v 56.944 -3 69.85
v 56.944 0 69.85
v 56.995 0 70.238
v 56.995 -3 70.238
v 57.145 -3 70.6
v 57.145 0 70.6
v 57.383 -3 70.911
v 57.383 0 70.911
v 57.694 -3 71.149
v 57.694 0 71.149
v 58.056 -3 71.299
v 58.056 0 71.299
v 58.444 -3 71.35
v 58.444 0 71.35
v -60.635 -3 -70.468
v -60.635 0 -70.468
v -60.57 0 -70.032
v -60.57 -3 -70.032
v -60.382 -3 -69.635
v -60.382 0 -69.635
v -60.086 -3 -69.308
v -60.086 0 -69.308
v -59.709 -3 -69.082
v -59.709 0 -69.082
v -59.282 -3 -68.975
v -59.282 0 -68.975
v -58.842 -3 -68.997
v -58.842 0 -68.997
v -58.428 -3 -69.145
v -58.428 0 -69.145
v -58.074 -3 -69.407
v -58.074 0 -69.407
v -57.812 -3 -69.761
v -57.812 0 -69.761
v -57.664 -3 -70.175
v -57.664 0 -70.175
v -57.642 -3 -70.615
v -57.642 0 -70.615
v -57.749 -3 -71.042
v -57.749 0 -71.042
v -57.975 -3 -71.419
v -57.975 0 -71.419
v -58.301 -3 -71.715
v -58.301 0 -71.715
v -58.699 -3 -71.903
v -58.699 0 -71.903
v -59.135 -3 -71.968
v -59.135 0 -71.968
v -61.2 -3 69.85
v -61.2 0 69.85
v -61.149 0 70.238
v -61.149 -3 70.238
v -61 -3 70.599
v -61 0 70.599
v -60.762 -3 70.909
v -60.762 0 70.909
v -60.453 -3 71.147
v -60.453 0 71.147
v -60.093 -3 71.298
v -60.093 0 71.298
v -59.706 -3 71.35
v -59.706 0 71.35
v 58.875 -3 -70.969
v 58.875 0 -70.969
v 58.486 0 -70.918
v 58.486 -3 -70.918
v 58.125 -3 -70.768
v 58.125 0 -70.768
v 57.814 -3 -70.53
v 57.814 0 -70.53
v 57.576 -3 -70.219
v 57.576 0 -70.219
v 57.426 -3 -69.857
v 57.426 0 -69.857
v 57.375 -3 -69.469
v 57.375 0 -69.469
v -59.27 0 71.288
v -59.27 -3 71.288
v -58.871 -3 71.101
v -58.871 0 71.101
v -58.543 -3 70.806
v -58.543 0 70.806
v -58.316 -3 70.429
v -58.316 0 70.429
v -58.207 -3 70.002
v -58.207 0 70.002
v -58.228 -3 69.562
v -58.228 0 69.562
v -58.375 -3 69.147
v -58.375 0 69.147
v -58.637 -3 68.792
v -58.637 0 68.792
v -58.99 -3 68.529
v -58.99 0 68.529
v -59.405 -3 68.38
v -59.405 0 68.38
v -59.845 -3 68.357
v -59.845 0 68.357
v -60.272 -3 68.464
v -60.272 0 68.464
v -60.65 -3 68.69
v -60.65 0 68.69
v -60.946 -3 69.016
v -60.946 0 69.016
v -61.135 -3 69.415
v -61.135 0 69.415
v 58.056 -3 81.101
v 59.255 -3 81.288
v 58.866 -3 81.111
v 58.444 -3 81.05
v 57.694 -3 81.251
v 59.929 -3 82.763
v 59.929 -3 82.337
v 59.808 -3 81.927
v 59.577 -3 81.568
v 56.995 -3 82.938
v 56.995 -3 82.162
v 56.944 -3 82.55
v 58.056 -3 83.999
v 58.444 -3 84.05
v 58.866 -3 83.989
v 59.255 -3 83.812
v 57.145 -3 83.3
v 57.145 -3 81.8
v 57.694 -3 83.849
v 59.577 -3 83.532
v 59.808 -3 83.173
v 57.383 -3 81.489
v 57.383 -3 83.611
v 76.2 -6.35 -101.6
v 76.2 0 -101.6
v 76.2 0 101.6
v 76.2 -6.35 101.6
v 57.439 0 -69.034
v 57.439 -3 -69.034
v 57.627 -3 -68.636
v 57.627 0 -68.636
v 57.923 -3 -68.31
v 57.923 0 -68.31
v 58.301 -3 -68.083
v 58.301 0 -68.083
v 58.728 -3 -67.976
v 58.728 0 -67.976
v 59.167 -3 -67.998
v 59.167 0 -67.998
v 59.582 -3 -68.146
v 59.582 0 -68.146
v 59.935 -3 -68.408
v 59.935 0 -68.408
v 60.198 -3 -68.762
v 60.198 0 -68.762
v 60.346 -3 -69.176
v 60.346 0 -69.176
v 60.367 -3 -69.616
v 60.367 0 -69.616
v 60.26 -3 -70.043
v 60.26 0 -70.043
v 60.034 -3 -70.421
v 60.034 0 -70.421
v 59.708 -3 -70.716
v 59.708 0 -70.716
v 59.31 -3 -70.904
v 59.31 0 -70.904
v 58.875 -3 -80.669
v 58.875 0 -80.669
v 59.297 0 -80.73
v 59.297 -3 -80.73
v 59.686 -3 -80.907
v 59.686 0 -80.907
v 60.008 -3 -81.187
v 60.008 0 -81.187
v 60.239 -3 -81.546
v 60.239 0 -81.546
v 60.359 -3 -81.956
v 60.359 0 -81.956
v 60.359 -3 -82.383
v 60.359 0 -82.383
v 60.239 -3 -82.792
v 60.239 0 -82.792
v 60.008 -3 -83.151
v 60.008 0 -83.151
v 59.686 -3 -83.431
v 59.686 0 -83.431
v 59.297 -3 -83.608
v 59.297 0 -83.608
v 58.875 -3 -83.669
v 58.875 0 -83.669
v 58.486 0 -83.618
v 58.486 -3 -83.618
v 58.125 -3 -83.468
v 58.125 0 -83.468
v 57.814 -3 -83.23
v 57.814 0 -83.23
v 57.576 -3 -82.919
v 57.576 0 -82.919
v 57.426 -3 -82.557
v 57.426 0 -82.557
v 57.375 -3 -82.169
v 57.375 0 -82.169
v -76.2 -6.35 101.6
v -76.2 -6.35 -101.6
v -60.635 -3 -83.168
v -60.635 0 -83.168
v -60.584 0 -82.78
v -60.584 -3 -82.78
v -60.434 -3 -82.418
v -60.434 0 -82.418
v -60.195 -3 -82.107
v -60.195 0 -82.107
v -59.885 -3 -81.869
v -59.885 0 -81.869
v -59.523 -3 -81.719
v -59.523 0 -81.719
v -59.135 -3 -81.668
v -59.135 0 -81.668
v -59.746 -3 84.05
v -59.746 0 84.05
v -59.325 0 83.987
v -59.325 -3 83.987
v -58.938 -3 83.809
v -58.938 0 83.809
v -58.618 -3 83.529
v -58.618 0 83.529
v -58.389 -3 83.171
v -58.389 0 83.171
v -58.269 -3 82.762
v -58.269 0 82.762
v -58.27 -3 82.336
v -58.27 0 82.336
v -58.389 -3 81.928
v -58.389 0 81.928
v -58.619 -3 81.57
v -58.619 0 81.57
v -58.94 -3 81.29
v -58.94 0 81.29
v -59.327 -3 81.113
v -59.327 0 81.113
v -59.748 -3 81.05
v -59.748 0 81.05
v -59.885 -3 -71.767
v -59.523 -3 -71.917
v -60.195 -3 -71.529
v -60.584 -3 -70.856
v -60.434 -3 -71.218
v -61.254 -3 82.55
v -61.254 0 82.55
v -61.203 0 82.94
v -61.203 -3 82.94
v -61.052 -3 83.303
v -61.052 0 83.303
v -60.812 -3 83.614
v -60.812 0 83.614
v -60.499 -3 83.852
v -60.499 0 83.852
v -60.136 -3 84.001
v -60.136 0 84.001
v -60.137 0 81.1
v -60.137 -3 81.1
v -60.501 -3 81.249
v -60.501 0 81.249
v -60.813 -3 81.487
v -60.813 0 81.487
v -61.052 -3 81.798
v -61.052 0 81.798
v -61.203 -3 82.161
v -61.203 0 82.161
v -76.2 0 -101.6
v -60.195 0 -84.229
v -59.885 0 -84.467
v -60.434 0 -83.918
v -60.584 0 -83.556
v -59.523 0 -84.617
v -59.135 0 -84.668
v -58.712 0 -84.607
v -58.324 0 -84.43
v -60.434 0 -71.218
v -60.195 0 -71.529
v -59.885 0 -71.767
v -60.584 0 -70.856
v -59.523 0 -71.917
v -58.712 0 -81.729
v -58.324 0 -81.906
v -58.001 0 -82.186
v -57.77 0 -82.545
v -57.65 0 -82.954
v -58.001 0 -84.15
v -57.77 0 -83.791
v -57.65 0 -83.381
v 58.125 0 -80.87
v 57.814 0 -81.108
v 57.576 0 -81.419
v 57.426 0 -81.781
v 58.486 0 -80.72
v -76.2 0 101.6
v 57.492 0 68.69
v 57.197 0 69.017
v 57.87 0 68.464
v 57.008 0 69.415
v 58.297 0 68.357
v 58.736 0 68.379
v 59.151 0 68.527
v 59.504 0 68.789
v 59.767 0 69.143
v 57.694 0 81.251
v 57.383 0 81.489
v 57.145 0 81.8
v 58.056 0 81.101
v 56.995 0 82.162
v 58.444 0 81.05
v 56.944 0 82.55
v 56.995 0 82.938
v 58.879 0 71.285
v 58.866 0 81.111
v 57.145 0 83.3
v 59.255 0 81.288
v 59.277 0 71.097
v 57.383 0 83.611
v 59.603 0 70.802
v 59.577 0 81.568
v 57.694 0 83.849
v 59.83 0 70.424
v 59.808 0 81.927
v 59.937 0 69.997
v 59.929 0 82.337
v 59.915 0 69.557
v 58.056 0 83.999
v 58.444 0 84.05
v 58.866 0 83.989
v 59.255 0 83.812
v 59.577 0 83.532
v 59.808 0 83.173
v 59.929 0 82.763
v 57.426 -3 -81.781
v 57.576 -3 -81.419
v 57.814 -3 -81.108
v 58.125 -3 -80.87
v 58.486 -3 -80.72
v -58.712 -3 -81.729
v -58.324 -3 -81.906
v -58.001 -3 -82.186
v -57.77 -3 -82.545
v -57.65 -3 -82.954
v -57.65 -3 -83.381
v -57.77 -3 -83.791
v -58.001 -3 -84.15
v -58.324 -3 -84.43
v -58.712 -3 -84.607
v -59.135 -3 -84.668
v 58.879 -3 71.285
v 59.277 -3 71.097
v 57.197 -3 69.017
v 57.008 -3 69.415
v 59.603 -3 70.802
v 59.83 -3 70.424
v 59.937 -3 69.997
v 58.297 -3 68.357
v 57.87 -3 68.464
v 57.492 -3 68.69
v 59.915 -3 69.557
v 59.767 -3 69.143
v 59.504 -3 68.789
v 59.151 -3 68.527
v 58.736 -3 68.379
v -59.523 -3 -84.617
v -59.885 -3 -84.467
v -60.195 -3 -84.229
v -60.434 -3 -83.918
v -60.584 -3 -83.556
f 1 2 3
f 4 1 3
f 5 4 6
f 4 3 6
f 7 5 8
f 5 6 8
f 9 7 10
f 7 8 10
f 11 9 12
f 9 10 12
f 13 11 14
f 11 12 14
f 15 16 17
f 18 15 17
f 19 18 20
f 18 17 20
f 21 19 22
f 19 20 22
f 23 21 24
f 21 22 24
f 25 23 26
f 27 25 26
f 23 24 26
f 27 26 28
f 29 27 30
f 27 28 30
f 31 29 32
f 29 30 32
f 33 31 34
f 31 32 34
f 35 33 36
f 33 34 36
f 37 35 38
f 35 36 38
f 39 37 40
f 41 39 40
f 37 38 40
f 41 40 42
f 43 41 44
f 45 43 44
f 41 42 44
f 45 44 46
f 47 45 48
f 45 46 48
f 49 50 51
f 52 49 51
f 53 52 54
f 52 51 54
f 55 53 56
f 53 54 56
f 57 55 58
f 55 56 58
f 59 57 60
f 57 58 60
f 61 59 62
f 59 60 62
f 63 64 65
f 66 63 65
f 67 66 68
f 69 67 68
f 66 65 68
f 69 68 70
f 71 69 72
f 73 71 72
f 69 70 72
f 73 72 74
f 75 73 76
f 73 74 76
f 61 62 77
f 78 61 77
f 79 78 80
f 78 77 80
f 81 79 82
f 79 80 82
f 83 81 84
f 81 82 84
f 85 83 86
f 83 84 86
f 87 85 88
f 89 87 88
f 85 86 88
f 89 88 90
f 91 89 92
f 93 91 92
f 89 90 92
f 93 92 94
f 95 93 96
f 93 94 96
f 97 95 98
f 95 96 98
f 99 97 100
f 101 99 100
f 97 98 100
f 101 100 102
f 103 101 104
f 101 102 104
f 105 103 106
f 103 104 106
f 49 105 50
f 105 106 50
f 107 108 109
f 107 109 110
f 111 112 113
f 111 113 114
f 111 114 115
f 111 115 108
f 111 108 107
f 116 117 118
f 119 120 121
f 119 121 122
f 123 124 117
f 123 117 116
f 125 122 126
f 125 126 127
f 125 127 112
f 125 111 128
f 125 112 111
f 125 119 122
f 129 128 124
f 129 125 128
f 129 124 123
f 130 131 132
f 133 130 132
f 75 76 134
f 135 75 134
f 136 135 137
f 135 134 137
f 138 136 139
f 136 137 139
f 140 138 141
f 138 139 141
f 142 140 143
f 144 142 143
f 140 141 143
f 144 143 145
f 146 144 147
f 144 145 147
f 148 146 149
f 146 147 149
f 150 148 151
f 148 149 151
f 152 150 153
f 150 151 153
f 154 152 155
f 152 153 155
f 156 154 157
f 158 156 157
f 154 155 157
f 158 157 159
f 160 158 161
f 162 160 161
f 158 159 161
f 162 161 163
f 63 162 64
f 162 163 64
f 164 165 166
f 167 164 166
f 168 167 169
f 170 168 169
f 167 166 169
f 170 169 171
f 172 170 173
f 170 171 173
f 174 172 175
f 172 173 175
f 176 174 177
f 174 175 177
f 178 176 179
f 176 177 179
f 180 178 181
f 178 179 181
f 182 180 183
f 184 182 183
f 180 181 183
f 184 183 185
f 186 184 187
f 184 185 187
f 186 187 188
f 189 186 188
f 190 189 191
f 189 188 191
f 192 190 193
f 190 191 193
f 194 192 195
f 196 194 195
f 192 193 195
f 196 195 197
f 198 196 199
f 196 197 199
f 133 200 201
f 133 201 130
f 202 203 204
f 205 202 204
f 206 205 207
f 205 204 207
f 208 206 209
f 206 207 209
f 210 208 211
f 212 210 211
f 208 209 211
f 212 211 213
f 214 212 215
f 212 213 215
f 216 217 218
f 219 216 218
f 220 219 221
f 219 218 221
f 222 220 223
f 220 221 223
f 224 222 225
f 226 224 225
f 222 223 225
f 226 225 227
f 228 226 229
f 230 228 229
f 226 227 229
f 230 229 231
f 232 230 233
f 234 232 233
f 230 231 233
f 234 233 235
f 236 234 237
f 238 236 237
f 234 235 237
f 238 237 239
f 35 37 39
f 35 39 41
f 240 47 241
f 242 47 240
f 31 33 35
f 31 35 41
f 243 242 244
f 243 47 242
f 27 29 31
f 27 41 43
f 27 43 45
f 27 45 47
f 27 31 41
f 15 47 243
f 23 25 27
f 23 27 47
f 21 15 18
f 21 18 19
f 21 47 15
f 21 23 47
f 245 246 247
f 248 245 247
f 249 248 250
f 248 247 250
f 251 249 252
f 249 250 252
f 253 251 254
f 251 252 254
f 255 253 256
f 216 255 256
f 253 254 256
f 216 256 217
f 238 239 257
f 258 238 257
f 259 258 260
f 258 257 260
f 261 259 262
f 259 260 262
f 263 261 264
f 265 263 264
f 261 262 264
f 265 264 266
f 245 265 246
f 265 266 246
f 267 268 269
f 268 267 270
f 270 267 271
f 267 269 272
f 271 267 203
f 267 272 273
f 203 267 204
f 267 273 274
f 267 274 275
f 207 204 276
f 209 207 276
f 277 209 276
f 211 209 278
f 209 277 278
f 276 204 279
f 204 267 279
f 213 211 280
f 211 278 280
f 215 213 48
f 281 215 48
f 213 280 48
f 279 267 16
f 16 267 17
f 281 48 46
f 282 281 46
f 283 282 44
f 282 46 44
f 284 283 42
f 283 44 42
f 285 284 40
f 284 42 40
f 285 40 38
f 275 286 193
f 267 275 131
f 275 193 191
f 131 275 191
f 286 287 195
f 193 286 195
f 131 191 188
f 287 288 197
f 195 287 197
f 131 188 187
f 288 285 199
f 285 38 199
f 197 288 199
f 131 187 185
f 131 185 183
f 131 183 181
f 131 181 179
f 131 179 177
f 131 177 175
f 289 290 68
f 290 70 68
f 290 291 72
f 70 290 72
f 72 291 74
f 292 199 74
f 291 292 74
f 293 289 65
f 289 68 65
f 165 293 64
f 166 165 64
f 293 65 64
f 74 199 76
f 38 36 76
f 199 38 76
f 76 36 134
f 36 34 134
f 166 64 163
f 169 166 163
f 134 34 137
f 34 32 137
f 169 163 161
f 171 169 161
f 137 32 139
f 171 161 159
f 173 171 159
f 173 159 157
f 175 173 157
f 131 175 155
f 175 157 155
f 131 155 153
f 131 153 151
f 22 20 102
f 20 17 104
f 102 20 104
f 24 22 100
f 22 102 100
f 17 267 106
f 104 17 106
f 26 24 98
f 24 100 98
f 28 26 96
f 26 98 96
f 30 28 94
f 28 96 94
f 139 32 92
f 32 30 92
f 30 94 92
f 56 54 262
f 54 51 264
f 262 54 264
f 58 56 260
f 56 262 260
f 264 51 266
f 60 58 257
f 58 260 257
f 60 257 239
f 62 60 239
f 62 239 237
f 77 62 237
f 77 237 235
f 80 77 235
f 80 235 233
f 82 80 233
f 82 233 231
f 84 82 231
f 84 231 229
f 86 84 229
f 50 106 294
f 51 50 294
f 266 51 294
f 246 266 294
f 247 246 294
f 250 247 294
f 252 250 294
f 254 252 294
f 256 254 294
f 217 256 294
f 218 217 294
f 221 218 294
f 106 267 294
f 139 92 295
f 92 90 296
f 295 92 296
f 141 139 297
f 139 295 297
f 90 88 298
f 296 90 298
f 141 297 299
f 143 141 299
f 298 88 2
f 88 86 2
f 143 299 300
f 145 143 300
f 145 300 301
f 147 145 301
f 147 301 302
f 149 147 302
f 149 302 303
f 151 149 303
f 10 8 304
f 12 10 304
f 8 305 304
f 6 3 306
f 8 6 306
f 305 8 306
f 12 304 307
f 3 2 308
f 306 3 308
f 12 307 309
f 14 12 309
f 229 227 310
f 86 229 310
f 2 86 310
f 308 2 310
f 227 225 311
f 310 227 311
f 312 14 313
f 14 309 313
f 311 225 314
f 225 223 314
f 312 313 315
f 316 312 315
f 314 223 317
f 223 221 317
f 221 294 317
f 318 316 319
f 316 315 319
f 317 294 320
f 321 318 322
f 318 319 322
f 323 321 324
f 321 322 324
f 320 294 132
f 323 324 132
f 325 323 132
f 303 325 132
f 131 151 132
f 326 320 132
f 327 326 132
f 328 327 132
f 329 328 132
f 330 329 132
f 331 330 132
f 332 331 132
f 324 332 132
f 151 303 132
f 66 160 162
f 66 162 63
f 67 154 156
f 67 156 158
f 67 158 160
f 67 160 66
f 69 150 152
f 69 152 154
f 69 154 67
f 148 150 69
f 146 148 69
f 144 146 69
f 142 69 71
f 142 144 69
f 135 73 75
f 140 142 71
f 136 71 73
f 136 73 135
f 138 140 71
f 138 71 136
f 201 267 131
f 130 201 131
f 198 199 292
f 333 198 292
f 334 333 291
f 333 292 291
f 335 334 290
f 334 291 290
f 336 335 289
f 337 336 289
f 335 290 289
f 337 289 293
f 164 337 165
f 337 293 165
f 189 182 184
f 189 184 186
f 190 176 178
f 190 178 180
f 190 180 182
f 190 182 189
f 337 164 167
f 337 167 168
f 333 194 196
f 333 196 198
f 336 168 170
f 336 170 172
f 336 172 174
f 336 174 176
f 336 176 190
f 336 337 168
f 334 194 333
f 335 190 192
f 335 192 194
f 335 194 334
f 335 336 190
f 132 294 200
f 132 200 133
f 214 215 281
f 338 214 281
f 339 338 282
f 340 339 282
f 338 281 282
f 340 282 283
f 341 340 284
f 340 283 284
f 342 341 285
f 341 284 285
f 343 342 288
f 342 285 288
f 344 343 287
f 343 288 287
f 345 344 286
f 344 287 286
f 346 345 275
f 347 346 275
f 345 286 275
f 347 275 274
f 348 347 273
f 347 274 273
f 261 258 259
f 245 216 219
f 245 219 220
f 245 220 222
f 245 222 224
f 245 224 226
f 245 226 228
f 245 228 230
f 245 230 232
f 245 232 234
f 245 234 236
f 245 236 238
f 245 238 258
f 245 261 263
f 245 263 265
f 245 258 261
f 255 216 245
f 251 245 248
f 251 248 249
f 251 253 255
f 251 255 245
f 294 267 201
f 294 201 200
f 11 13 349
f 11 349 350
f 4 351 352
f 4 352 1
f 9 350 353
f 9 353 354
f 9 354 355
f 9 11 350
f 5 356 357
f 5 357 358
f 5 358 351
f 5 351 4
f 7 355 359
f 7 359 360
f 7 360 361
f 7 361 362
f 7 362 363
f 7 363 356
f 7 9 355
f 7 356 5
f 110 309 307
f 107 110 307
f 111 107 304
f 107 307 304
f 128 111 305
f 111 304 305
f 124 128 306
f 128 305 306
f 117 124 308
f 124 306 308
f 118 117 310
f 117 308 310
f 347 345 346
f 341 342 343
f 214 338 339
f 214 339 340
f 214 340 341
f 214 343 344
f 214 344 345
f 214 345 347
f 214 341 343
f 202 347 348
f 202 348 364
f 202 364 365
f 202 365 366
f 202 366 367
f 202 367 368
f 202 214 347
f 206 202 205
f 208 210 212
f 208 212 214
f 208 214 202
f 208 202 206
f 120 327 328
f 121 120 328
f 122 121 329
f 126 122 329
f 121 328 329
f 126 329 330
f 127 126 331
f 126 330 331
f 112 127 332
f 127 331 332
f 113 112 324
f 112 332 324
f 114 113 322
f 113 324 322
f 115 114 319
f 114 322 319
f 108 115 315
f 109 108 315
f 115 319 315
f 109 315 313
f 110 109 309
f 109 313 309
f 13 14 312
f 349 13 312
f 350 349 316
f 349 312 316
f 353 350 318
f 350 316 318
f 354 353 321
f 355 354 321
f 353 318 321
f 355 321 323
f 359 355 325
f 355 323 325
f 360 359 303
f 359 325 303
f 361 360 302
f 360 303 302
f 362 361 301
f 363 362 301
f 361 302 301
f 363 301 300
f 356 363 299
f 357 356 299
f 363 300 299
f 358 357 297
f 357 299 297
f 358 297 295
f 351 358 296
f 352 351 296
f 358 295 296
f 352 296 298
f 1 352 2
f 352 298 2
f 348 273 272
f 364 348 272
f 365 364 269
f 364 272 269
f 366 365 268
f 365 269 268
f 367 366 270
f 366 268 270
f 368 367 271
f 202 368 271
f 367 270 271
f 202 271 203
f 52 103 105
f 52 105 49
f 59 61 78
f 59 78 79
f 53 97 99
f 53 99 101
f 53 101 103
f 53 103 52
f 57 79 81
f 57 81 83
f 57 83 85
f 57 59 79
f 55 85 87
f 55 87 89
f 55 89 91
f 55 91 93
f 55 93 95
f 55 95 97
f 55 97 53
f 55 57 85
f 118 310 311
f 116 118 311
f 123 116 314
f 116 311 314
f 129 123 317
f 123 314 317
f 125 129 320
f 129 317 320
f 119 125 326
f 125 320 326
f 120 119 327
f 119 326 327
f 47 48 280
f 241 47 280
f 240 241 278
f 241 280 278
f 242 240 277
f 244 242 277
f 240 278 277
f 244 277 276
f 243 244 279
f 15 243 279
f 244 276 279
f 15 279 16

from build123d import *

# Parameters (mm, degrees)
F0_W     = 152.4
F0_H     = 203.2
F1_DEPTH = 6.35
F5_DEPTH = 3
F6_DEPTH = 3
F7_DEPTH = 3
F9_DEPTH = 3


with BuildPart() as f1:
    # F0 (on Front) → F1 (new body)
    with BuildSketch(Plane.XZ):
        Rectangle(F0_W, F0_H)
    extrude(amount=F1_DEPTH)

    # F4 (on face) → F5 (cut)
    with BuildSketch(Plane(origin=(0, 0, 0), x_dir=(-1, 0, 0), z_dir=(0, 1, 0))):
        with BuildLine():
            ThreePointArc((-58.874667, -80.669072), (-60.374667, -82.169072), (-58.874667, -83.669072))
            Line((-58.874667, -83.669072), (-58.874667, -82.169072))
            Line((-58.874667, -82.169072), (-58.874667, -80.669072))
        make_face()
        with BuildLine():
            ThreePointArc((-57.374667, -69.469072), (-59.935327, -68.408412), (-58.874667, -70.969072))
            ThreePointArc((-58.874667, -70.969072), (-57.814007, -70.529732), (-57.374667, -69.469072))
        make_face()
        with BuildLine():
            Line((-58.874667, -82.169072), (-58.874667, -83.669072))
            ThreePointArc((-58.874667, -83.669072), (-57.814007, -83.229732), (-57.374667, -82.169072))
            ThreePointArc((-57.374667, -82.169072), (-57.814007, -81.108412), (-58.874667, -80.669072))
            Line((-58.874667, -80.669072), (-58.874667, -82.169072))
        make_face()
    extrude(amount=-F5_DEPTH, mode=Mode.SUBTRACT)

    # F3 (on face) → F6 (cut)
    with BuildSketch(Plane(origin=(0, 0, 0), x_dir=(-1, 0, 0), z_dir=(0, 1, 0))):
        with BuildLine():
            ThreePointArc((59.134699, -81.667865), (57.634699, -83.167865), (59.134699, -84.667865))
            Line((59.134699, -84.667865), (59.134699, -83.167865))
            Line((59.134699, -83.167865), (59.134699, -81.667865))
        make_face()
        with BuildLine():
            ThreePointArc((60.634699, -70.467865), (58.074039, -69.407205), (59.134699, -71.967865))
            ThreePointArc((59.134699, -71.967865), (60.19536, -71.528525), (60.634699, -70.467865))
        make_face()
        with BuildLine():
            Line((59.134699, -83.167865), (59.134699, -84.667865))
            ThreePointArc((59.134699, -84.667865), (60.19536, -84.228525), (60.634699, -83.167865))
            ThreePointArc((60.634699, -83.167865), (60.19536, -82.107205), (59.134699, -81.667865))
            Line((59.134699, -81.667865), (59.134699, -83.167865))
        make_face()
    extrude(amount=-F6_DEPTH, mode=Mode.SUBTRACT)

    # F2 (on face) → F7 (cut)
    with BuildSketch(Plane(origin=(0, 0, 0), x_dir=(-1, 0, 0), z_dir=(0, 1, 0))):
        with BuildLine():
            ThreePointArc((-56.943826, 82.55), (-57.383166, 83.61066), (-58.443826, 84.05))
            Line((-58.443826, 84.05), (-58.443826, 82.55))
            Line((-58.443826, 82.55), (-58.443826, 81.05))
            ThreePointArc((-58.443826, 81.05), (-57.383166, 81.48934), (-56.943826, 82.55))
        make_face()
        with BuildLine():
            ThreePointArc((-56.943826, 69.85), (-57.383166, 70.91066), (-58.443826, 71.35))
            ThreePointArc((-58.443826, 71.35), (-59.504486, 68.78934), (-56.943826, 69.85))
        make_face()
        with BuildLine():
            Line((-58.443826, 82.55), (-58.443826, 84.05))
            ThreePointArc((-58.443826, 84.05), (-59.943826, 82.55), (-58.443826, 81.05))
            Line((-58.443826, 81.05), (-58.443826, 82.55))
        make_face()
    extrude(amount=-F7_DEPTH, mode=Mode.SUBTRACT)

    # F8 (on face) → F9 (cut)
    with BuildSketch(Plane(origin=(0, 0, 0), x_dir=(-1, 0, 0), z_dir=(0, 1, 0))):
        with BuildLine():
            ThreePointArc((61.254328, 82.550315), (60.811933, 83.614022), (59.745698, 84.05029))
            Line((59.745698, 84.05029), (59.754328, 82.550315))
            Line((59.754328, 82.550315), (59.747856, 81.050329))
            ThreePointArc((59.747856, 81.050329), (60.812698, 81.487369), (61.254328, 82.550315))
        make_face()
        with BuildLine():
            ThreePointArc((61.199527, 69.850434), (60.762473, 70.908803), (59.705999, 71.35042))
            ThreePointArc((59.705999, 71.35042), (58.636581, 68.792064), (61.199527, 69.850434))
        make_face()
        with BuildLine():
            Line((59.754328, 82.550315), (59.745698, 84.05029))
            ThreePointArc((59.745698, 84.05029), (58.254329, 82.549237), (59.747856, 81.050329))
            Line((59.747856, 81.050329), (59.754328, 82.550315))
        make_face()
    extrude(amount=-F9_DEPTH, mode=Mode.SUBTRACT)


solid = f1.part
